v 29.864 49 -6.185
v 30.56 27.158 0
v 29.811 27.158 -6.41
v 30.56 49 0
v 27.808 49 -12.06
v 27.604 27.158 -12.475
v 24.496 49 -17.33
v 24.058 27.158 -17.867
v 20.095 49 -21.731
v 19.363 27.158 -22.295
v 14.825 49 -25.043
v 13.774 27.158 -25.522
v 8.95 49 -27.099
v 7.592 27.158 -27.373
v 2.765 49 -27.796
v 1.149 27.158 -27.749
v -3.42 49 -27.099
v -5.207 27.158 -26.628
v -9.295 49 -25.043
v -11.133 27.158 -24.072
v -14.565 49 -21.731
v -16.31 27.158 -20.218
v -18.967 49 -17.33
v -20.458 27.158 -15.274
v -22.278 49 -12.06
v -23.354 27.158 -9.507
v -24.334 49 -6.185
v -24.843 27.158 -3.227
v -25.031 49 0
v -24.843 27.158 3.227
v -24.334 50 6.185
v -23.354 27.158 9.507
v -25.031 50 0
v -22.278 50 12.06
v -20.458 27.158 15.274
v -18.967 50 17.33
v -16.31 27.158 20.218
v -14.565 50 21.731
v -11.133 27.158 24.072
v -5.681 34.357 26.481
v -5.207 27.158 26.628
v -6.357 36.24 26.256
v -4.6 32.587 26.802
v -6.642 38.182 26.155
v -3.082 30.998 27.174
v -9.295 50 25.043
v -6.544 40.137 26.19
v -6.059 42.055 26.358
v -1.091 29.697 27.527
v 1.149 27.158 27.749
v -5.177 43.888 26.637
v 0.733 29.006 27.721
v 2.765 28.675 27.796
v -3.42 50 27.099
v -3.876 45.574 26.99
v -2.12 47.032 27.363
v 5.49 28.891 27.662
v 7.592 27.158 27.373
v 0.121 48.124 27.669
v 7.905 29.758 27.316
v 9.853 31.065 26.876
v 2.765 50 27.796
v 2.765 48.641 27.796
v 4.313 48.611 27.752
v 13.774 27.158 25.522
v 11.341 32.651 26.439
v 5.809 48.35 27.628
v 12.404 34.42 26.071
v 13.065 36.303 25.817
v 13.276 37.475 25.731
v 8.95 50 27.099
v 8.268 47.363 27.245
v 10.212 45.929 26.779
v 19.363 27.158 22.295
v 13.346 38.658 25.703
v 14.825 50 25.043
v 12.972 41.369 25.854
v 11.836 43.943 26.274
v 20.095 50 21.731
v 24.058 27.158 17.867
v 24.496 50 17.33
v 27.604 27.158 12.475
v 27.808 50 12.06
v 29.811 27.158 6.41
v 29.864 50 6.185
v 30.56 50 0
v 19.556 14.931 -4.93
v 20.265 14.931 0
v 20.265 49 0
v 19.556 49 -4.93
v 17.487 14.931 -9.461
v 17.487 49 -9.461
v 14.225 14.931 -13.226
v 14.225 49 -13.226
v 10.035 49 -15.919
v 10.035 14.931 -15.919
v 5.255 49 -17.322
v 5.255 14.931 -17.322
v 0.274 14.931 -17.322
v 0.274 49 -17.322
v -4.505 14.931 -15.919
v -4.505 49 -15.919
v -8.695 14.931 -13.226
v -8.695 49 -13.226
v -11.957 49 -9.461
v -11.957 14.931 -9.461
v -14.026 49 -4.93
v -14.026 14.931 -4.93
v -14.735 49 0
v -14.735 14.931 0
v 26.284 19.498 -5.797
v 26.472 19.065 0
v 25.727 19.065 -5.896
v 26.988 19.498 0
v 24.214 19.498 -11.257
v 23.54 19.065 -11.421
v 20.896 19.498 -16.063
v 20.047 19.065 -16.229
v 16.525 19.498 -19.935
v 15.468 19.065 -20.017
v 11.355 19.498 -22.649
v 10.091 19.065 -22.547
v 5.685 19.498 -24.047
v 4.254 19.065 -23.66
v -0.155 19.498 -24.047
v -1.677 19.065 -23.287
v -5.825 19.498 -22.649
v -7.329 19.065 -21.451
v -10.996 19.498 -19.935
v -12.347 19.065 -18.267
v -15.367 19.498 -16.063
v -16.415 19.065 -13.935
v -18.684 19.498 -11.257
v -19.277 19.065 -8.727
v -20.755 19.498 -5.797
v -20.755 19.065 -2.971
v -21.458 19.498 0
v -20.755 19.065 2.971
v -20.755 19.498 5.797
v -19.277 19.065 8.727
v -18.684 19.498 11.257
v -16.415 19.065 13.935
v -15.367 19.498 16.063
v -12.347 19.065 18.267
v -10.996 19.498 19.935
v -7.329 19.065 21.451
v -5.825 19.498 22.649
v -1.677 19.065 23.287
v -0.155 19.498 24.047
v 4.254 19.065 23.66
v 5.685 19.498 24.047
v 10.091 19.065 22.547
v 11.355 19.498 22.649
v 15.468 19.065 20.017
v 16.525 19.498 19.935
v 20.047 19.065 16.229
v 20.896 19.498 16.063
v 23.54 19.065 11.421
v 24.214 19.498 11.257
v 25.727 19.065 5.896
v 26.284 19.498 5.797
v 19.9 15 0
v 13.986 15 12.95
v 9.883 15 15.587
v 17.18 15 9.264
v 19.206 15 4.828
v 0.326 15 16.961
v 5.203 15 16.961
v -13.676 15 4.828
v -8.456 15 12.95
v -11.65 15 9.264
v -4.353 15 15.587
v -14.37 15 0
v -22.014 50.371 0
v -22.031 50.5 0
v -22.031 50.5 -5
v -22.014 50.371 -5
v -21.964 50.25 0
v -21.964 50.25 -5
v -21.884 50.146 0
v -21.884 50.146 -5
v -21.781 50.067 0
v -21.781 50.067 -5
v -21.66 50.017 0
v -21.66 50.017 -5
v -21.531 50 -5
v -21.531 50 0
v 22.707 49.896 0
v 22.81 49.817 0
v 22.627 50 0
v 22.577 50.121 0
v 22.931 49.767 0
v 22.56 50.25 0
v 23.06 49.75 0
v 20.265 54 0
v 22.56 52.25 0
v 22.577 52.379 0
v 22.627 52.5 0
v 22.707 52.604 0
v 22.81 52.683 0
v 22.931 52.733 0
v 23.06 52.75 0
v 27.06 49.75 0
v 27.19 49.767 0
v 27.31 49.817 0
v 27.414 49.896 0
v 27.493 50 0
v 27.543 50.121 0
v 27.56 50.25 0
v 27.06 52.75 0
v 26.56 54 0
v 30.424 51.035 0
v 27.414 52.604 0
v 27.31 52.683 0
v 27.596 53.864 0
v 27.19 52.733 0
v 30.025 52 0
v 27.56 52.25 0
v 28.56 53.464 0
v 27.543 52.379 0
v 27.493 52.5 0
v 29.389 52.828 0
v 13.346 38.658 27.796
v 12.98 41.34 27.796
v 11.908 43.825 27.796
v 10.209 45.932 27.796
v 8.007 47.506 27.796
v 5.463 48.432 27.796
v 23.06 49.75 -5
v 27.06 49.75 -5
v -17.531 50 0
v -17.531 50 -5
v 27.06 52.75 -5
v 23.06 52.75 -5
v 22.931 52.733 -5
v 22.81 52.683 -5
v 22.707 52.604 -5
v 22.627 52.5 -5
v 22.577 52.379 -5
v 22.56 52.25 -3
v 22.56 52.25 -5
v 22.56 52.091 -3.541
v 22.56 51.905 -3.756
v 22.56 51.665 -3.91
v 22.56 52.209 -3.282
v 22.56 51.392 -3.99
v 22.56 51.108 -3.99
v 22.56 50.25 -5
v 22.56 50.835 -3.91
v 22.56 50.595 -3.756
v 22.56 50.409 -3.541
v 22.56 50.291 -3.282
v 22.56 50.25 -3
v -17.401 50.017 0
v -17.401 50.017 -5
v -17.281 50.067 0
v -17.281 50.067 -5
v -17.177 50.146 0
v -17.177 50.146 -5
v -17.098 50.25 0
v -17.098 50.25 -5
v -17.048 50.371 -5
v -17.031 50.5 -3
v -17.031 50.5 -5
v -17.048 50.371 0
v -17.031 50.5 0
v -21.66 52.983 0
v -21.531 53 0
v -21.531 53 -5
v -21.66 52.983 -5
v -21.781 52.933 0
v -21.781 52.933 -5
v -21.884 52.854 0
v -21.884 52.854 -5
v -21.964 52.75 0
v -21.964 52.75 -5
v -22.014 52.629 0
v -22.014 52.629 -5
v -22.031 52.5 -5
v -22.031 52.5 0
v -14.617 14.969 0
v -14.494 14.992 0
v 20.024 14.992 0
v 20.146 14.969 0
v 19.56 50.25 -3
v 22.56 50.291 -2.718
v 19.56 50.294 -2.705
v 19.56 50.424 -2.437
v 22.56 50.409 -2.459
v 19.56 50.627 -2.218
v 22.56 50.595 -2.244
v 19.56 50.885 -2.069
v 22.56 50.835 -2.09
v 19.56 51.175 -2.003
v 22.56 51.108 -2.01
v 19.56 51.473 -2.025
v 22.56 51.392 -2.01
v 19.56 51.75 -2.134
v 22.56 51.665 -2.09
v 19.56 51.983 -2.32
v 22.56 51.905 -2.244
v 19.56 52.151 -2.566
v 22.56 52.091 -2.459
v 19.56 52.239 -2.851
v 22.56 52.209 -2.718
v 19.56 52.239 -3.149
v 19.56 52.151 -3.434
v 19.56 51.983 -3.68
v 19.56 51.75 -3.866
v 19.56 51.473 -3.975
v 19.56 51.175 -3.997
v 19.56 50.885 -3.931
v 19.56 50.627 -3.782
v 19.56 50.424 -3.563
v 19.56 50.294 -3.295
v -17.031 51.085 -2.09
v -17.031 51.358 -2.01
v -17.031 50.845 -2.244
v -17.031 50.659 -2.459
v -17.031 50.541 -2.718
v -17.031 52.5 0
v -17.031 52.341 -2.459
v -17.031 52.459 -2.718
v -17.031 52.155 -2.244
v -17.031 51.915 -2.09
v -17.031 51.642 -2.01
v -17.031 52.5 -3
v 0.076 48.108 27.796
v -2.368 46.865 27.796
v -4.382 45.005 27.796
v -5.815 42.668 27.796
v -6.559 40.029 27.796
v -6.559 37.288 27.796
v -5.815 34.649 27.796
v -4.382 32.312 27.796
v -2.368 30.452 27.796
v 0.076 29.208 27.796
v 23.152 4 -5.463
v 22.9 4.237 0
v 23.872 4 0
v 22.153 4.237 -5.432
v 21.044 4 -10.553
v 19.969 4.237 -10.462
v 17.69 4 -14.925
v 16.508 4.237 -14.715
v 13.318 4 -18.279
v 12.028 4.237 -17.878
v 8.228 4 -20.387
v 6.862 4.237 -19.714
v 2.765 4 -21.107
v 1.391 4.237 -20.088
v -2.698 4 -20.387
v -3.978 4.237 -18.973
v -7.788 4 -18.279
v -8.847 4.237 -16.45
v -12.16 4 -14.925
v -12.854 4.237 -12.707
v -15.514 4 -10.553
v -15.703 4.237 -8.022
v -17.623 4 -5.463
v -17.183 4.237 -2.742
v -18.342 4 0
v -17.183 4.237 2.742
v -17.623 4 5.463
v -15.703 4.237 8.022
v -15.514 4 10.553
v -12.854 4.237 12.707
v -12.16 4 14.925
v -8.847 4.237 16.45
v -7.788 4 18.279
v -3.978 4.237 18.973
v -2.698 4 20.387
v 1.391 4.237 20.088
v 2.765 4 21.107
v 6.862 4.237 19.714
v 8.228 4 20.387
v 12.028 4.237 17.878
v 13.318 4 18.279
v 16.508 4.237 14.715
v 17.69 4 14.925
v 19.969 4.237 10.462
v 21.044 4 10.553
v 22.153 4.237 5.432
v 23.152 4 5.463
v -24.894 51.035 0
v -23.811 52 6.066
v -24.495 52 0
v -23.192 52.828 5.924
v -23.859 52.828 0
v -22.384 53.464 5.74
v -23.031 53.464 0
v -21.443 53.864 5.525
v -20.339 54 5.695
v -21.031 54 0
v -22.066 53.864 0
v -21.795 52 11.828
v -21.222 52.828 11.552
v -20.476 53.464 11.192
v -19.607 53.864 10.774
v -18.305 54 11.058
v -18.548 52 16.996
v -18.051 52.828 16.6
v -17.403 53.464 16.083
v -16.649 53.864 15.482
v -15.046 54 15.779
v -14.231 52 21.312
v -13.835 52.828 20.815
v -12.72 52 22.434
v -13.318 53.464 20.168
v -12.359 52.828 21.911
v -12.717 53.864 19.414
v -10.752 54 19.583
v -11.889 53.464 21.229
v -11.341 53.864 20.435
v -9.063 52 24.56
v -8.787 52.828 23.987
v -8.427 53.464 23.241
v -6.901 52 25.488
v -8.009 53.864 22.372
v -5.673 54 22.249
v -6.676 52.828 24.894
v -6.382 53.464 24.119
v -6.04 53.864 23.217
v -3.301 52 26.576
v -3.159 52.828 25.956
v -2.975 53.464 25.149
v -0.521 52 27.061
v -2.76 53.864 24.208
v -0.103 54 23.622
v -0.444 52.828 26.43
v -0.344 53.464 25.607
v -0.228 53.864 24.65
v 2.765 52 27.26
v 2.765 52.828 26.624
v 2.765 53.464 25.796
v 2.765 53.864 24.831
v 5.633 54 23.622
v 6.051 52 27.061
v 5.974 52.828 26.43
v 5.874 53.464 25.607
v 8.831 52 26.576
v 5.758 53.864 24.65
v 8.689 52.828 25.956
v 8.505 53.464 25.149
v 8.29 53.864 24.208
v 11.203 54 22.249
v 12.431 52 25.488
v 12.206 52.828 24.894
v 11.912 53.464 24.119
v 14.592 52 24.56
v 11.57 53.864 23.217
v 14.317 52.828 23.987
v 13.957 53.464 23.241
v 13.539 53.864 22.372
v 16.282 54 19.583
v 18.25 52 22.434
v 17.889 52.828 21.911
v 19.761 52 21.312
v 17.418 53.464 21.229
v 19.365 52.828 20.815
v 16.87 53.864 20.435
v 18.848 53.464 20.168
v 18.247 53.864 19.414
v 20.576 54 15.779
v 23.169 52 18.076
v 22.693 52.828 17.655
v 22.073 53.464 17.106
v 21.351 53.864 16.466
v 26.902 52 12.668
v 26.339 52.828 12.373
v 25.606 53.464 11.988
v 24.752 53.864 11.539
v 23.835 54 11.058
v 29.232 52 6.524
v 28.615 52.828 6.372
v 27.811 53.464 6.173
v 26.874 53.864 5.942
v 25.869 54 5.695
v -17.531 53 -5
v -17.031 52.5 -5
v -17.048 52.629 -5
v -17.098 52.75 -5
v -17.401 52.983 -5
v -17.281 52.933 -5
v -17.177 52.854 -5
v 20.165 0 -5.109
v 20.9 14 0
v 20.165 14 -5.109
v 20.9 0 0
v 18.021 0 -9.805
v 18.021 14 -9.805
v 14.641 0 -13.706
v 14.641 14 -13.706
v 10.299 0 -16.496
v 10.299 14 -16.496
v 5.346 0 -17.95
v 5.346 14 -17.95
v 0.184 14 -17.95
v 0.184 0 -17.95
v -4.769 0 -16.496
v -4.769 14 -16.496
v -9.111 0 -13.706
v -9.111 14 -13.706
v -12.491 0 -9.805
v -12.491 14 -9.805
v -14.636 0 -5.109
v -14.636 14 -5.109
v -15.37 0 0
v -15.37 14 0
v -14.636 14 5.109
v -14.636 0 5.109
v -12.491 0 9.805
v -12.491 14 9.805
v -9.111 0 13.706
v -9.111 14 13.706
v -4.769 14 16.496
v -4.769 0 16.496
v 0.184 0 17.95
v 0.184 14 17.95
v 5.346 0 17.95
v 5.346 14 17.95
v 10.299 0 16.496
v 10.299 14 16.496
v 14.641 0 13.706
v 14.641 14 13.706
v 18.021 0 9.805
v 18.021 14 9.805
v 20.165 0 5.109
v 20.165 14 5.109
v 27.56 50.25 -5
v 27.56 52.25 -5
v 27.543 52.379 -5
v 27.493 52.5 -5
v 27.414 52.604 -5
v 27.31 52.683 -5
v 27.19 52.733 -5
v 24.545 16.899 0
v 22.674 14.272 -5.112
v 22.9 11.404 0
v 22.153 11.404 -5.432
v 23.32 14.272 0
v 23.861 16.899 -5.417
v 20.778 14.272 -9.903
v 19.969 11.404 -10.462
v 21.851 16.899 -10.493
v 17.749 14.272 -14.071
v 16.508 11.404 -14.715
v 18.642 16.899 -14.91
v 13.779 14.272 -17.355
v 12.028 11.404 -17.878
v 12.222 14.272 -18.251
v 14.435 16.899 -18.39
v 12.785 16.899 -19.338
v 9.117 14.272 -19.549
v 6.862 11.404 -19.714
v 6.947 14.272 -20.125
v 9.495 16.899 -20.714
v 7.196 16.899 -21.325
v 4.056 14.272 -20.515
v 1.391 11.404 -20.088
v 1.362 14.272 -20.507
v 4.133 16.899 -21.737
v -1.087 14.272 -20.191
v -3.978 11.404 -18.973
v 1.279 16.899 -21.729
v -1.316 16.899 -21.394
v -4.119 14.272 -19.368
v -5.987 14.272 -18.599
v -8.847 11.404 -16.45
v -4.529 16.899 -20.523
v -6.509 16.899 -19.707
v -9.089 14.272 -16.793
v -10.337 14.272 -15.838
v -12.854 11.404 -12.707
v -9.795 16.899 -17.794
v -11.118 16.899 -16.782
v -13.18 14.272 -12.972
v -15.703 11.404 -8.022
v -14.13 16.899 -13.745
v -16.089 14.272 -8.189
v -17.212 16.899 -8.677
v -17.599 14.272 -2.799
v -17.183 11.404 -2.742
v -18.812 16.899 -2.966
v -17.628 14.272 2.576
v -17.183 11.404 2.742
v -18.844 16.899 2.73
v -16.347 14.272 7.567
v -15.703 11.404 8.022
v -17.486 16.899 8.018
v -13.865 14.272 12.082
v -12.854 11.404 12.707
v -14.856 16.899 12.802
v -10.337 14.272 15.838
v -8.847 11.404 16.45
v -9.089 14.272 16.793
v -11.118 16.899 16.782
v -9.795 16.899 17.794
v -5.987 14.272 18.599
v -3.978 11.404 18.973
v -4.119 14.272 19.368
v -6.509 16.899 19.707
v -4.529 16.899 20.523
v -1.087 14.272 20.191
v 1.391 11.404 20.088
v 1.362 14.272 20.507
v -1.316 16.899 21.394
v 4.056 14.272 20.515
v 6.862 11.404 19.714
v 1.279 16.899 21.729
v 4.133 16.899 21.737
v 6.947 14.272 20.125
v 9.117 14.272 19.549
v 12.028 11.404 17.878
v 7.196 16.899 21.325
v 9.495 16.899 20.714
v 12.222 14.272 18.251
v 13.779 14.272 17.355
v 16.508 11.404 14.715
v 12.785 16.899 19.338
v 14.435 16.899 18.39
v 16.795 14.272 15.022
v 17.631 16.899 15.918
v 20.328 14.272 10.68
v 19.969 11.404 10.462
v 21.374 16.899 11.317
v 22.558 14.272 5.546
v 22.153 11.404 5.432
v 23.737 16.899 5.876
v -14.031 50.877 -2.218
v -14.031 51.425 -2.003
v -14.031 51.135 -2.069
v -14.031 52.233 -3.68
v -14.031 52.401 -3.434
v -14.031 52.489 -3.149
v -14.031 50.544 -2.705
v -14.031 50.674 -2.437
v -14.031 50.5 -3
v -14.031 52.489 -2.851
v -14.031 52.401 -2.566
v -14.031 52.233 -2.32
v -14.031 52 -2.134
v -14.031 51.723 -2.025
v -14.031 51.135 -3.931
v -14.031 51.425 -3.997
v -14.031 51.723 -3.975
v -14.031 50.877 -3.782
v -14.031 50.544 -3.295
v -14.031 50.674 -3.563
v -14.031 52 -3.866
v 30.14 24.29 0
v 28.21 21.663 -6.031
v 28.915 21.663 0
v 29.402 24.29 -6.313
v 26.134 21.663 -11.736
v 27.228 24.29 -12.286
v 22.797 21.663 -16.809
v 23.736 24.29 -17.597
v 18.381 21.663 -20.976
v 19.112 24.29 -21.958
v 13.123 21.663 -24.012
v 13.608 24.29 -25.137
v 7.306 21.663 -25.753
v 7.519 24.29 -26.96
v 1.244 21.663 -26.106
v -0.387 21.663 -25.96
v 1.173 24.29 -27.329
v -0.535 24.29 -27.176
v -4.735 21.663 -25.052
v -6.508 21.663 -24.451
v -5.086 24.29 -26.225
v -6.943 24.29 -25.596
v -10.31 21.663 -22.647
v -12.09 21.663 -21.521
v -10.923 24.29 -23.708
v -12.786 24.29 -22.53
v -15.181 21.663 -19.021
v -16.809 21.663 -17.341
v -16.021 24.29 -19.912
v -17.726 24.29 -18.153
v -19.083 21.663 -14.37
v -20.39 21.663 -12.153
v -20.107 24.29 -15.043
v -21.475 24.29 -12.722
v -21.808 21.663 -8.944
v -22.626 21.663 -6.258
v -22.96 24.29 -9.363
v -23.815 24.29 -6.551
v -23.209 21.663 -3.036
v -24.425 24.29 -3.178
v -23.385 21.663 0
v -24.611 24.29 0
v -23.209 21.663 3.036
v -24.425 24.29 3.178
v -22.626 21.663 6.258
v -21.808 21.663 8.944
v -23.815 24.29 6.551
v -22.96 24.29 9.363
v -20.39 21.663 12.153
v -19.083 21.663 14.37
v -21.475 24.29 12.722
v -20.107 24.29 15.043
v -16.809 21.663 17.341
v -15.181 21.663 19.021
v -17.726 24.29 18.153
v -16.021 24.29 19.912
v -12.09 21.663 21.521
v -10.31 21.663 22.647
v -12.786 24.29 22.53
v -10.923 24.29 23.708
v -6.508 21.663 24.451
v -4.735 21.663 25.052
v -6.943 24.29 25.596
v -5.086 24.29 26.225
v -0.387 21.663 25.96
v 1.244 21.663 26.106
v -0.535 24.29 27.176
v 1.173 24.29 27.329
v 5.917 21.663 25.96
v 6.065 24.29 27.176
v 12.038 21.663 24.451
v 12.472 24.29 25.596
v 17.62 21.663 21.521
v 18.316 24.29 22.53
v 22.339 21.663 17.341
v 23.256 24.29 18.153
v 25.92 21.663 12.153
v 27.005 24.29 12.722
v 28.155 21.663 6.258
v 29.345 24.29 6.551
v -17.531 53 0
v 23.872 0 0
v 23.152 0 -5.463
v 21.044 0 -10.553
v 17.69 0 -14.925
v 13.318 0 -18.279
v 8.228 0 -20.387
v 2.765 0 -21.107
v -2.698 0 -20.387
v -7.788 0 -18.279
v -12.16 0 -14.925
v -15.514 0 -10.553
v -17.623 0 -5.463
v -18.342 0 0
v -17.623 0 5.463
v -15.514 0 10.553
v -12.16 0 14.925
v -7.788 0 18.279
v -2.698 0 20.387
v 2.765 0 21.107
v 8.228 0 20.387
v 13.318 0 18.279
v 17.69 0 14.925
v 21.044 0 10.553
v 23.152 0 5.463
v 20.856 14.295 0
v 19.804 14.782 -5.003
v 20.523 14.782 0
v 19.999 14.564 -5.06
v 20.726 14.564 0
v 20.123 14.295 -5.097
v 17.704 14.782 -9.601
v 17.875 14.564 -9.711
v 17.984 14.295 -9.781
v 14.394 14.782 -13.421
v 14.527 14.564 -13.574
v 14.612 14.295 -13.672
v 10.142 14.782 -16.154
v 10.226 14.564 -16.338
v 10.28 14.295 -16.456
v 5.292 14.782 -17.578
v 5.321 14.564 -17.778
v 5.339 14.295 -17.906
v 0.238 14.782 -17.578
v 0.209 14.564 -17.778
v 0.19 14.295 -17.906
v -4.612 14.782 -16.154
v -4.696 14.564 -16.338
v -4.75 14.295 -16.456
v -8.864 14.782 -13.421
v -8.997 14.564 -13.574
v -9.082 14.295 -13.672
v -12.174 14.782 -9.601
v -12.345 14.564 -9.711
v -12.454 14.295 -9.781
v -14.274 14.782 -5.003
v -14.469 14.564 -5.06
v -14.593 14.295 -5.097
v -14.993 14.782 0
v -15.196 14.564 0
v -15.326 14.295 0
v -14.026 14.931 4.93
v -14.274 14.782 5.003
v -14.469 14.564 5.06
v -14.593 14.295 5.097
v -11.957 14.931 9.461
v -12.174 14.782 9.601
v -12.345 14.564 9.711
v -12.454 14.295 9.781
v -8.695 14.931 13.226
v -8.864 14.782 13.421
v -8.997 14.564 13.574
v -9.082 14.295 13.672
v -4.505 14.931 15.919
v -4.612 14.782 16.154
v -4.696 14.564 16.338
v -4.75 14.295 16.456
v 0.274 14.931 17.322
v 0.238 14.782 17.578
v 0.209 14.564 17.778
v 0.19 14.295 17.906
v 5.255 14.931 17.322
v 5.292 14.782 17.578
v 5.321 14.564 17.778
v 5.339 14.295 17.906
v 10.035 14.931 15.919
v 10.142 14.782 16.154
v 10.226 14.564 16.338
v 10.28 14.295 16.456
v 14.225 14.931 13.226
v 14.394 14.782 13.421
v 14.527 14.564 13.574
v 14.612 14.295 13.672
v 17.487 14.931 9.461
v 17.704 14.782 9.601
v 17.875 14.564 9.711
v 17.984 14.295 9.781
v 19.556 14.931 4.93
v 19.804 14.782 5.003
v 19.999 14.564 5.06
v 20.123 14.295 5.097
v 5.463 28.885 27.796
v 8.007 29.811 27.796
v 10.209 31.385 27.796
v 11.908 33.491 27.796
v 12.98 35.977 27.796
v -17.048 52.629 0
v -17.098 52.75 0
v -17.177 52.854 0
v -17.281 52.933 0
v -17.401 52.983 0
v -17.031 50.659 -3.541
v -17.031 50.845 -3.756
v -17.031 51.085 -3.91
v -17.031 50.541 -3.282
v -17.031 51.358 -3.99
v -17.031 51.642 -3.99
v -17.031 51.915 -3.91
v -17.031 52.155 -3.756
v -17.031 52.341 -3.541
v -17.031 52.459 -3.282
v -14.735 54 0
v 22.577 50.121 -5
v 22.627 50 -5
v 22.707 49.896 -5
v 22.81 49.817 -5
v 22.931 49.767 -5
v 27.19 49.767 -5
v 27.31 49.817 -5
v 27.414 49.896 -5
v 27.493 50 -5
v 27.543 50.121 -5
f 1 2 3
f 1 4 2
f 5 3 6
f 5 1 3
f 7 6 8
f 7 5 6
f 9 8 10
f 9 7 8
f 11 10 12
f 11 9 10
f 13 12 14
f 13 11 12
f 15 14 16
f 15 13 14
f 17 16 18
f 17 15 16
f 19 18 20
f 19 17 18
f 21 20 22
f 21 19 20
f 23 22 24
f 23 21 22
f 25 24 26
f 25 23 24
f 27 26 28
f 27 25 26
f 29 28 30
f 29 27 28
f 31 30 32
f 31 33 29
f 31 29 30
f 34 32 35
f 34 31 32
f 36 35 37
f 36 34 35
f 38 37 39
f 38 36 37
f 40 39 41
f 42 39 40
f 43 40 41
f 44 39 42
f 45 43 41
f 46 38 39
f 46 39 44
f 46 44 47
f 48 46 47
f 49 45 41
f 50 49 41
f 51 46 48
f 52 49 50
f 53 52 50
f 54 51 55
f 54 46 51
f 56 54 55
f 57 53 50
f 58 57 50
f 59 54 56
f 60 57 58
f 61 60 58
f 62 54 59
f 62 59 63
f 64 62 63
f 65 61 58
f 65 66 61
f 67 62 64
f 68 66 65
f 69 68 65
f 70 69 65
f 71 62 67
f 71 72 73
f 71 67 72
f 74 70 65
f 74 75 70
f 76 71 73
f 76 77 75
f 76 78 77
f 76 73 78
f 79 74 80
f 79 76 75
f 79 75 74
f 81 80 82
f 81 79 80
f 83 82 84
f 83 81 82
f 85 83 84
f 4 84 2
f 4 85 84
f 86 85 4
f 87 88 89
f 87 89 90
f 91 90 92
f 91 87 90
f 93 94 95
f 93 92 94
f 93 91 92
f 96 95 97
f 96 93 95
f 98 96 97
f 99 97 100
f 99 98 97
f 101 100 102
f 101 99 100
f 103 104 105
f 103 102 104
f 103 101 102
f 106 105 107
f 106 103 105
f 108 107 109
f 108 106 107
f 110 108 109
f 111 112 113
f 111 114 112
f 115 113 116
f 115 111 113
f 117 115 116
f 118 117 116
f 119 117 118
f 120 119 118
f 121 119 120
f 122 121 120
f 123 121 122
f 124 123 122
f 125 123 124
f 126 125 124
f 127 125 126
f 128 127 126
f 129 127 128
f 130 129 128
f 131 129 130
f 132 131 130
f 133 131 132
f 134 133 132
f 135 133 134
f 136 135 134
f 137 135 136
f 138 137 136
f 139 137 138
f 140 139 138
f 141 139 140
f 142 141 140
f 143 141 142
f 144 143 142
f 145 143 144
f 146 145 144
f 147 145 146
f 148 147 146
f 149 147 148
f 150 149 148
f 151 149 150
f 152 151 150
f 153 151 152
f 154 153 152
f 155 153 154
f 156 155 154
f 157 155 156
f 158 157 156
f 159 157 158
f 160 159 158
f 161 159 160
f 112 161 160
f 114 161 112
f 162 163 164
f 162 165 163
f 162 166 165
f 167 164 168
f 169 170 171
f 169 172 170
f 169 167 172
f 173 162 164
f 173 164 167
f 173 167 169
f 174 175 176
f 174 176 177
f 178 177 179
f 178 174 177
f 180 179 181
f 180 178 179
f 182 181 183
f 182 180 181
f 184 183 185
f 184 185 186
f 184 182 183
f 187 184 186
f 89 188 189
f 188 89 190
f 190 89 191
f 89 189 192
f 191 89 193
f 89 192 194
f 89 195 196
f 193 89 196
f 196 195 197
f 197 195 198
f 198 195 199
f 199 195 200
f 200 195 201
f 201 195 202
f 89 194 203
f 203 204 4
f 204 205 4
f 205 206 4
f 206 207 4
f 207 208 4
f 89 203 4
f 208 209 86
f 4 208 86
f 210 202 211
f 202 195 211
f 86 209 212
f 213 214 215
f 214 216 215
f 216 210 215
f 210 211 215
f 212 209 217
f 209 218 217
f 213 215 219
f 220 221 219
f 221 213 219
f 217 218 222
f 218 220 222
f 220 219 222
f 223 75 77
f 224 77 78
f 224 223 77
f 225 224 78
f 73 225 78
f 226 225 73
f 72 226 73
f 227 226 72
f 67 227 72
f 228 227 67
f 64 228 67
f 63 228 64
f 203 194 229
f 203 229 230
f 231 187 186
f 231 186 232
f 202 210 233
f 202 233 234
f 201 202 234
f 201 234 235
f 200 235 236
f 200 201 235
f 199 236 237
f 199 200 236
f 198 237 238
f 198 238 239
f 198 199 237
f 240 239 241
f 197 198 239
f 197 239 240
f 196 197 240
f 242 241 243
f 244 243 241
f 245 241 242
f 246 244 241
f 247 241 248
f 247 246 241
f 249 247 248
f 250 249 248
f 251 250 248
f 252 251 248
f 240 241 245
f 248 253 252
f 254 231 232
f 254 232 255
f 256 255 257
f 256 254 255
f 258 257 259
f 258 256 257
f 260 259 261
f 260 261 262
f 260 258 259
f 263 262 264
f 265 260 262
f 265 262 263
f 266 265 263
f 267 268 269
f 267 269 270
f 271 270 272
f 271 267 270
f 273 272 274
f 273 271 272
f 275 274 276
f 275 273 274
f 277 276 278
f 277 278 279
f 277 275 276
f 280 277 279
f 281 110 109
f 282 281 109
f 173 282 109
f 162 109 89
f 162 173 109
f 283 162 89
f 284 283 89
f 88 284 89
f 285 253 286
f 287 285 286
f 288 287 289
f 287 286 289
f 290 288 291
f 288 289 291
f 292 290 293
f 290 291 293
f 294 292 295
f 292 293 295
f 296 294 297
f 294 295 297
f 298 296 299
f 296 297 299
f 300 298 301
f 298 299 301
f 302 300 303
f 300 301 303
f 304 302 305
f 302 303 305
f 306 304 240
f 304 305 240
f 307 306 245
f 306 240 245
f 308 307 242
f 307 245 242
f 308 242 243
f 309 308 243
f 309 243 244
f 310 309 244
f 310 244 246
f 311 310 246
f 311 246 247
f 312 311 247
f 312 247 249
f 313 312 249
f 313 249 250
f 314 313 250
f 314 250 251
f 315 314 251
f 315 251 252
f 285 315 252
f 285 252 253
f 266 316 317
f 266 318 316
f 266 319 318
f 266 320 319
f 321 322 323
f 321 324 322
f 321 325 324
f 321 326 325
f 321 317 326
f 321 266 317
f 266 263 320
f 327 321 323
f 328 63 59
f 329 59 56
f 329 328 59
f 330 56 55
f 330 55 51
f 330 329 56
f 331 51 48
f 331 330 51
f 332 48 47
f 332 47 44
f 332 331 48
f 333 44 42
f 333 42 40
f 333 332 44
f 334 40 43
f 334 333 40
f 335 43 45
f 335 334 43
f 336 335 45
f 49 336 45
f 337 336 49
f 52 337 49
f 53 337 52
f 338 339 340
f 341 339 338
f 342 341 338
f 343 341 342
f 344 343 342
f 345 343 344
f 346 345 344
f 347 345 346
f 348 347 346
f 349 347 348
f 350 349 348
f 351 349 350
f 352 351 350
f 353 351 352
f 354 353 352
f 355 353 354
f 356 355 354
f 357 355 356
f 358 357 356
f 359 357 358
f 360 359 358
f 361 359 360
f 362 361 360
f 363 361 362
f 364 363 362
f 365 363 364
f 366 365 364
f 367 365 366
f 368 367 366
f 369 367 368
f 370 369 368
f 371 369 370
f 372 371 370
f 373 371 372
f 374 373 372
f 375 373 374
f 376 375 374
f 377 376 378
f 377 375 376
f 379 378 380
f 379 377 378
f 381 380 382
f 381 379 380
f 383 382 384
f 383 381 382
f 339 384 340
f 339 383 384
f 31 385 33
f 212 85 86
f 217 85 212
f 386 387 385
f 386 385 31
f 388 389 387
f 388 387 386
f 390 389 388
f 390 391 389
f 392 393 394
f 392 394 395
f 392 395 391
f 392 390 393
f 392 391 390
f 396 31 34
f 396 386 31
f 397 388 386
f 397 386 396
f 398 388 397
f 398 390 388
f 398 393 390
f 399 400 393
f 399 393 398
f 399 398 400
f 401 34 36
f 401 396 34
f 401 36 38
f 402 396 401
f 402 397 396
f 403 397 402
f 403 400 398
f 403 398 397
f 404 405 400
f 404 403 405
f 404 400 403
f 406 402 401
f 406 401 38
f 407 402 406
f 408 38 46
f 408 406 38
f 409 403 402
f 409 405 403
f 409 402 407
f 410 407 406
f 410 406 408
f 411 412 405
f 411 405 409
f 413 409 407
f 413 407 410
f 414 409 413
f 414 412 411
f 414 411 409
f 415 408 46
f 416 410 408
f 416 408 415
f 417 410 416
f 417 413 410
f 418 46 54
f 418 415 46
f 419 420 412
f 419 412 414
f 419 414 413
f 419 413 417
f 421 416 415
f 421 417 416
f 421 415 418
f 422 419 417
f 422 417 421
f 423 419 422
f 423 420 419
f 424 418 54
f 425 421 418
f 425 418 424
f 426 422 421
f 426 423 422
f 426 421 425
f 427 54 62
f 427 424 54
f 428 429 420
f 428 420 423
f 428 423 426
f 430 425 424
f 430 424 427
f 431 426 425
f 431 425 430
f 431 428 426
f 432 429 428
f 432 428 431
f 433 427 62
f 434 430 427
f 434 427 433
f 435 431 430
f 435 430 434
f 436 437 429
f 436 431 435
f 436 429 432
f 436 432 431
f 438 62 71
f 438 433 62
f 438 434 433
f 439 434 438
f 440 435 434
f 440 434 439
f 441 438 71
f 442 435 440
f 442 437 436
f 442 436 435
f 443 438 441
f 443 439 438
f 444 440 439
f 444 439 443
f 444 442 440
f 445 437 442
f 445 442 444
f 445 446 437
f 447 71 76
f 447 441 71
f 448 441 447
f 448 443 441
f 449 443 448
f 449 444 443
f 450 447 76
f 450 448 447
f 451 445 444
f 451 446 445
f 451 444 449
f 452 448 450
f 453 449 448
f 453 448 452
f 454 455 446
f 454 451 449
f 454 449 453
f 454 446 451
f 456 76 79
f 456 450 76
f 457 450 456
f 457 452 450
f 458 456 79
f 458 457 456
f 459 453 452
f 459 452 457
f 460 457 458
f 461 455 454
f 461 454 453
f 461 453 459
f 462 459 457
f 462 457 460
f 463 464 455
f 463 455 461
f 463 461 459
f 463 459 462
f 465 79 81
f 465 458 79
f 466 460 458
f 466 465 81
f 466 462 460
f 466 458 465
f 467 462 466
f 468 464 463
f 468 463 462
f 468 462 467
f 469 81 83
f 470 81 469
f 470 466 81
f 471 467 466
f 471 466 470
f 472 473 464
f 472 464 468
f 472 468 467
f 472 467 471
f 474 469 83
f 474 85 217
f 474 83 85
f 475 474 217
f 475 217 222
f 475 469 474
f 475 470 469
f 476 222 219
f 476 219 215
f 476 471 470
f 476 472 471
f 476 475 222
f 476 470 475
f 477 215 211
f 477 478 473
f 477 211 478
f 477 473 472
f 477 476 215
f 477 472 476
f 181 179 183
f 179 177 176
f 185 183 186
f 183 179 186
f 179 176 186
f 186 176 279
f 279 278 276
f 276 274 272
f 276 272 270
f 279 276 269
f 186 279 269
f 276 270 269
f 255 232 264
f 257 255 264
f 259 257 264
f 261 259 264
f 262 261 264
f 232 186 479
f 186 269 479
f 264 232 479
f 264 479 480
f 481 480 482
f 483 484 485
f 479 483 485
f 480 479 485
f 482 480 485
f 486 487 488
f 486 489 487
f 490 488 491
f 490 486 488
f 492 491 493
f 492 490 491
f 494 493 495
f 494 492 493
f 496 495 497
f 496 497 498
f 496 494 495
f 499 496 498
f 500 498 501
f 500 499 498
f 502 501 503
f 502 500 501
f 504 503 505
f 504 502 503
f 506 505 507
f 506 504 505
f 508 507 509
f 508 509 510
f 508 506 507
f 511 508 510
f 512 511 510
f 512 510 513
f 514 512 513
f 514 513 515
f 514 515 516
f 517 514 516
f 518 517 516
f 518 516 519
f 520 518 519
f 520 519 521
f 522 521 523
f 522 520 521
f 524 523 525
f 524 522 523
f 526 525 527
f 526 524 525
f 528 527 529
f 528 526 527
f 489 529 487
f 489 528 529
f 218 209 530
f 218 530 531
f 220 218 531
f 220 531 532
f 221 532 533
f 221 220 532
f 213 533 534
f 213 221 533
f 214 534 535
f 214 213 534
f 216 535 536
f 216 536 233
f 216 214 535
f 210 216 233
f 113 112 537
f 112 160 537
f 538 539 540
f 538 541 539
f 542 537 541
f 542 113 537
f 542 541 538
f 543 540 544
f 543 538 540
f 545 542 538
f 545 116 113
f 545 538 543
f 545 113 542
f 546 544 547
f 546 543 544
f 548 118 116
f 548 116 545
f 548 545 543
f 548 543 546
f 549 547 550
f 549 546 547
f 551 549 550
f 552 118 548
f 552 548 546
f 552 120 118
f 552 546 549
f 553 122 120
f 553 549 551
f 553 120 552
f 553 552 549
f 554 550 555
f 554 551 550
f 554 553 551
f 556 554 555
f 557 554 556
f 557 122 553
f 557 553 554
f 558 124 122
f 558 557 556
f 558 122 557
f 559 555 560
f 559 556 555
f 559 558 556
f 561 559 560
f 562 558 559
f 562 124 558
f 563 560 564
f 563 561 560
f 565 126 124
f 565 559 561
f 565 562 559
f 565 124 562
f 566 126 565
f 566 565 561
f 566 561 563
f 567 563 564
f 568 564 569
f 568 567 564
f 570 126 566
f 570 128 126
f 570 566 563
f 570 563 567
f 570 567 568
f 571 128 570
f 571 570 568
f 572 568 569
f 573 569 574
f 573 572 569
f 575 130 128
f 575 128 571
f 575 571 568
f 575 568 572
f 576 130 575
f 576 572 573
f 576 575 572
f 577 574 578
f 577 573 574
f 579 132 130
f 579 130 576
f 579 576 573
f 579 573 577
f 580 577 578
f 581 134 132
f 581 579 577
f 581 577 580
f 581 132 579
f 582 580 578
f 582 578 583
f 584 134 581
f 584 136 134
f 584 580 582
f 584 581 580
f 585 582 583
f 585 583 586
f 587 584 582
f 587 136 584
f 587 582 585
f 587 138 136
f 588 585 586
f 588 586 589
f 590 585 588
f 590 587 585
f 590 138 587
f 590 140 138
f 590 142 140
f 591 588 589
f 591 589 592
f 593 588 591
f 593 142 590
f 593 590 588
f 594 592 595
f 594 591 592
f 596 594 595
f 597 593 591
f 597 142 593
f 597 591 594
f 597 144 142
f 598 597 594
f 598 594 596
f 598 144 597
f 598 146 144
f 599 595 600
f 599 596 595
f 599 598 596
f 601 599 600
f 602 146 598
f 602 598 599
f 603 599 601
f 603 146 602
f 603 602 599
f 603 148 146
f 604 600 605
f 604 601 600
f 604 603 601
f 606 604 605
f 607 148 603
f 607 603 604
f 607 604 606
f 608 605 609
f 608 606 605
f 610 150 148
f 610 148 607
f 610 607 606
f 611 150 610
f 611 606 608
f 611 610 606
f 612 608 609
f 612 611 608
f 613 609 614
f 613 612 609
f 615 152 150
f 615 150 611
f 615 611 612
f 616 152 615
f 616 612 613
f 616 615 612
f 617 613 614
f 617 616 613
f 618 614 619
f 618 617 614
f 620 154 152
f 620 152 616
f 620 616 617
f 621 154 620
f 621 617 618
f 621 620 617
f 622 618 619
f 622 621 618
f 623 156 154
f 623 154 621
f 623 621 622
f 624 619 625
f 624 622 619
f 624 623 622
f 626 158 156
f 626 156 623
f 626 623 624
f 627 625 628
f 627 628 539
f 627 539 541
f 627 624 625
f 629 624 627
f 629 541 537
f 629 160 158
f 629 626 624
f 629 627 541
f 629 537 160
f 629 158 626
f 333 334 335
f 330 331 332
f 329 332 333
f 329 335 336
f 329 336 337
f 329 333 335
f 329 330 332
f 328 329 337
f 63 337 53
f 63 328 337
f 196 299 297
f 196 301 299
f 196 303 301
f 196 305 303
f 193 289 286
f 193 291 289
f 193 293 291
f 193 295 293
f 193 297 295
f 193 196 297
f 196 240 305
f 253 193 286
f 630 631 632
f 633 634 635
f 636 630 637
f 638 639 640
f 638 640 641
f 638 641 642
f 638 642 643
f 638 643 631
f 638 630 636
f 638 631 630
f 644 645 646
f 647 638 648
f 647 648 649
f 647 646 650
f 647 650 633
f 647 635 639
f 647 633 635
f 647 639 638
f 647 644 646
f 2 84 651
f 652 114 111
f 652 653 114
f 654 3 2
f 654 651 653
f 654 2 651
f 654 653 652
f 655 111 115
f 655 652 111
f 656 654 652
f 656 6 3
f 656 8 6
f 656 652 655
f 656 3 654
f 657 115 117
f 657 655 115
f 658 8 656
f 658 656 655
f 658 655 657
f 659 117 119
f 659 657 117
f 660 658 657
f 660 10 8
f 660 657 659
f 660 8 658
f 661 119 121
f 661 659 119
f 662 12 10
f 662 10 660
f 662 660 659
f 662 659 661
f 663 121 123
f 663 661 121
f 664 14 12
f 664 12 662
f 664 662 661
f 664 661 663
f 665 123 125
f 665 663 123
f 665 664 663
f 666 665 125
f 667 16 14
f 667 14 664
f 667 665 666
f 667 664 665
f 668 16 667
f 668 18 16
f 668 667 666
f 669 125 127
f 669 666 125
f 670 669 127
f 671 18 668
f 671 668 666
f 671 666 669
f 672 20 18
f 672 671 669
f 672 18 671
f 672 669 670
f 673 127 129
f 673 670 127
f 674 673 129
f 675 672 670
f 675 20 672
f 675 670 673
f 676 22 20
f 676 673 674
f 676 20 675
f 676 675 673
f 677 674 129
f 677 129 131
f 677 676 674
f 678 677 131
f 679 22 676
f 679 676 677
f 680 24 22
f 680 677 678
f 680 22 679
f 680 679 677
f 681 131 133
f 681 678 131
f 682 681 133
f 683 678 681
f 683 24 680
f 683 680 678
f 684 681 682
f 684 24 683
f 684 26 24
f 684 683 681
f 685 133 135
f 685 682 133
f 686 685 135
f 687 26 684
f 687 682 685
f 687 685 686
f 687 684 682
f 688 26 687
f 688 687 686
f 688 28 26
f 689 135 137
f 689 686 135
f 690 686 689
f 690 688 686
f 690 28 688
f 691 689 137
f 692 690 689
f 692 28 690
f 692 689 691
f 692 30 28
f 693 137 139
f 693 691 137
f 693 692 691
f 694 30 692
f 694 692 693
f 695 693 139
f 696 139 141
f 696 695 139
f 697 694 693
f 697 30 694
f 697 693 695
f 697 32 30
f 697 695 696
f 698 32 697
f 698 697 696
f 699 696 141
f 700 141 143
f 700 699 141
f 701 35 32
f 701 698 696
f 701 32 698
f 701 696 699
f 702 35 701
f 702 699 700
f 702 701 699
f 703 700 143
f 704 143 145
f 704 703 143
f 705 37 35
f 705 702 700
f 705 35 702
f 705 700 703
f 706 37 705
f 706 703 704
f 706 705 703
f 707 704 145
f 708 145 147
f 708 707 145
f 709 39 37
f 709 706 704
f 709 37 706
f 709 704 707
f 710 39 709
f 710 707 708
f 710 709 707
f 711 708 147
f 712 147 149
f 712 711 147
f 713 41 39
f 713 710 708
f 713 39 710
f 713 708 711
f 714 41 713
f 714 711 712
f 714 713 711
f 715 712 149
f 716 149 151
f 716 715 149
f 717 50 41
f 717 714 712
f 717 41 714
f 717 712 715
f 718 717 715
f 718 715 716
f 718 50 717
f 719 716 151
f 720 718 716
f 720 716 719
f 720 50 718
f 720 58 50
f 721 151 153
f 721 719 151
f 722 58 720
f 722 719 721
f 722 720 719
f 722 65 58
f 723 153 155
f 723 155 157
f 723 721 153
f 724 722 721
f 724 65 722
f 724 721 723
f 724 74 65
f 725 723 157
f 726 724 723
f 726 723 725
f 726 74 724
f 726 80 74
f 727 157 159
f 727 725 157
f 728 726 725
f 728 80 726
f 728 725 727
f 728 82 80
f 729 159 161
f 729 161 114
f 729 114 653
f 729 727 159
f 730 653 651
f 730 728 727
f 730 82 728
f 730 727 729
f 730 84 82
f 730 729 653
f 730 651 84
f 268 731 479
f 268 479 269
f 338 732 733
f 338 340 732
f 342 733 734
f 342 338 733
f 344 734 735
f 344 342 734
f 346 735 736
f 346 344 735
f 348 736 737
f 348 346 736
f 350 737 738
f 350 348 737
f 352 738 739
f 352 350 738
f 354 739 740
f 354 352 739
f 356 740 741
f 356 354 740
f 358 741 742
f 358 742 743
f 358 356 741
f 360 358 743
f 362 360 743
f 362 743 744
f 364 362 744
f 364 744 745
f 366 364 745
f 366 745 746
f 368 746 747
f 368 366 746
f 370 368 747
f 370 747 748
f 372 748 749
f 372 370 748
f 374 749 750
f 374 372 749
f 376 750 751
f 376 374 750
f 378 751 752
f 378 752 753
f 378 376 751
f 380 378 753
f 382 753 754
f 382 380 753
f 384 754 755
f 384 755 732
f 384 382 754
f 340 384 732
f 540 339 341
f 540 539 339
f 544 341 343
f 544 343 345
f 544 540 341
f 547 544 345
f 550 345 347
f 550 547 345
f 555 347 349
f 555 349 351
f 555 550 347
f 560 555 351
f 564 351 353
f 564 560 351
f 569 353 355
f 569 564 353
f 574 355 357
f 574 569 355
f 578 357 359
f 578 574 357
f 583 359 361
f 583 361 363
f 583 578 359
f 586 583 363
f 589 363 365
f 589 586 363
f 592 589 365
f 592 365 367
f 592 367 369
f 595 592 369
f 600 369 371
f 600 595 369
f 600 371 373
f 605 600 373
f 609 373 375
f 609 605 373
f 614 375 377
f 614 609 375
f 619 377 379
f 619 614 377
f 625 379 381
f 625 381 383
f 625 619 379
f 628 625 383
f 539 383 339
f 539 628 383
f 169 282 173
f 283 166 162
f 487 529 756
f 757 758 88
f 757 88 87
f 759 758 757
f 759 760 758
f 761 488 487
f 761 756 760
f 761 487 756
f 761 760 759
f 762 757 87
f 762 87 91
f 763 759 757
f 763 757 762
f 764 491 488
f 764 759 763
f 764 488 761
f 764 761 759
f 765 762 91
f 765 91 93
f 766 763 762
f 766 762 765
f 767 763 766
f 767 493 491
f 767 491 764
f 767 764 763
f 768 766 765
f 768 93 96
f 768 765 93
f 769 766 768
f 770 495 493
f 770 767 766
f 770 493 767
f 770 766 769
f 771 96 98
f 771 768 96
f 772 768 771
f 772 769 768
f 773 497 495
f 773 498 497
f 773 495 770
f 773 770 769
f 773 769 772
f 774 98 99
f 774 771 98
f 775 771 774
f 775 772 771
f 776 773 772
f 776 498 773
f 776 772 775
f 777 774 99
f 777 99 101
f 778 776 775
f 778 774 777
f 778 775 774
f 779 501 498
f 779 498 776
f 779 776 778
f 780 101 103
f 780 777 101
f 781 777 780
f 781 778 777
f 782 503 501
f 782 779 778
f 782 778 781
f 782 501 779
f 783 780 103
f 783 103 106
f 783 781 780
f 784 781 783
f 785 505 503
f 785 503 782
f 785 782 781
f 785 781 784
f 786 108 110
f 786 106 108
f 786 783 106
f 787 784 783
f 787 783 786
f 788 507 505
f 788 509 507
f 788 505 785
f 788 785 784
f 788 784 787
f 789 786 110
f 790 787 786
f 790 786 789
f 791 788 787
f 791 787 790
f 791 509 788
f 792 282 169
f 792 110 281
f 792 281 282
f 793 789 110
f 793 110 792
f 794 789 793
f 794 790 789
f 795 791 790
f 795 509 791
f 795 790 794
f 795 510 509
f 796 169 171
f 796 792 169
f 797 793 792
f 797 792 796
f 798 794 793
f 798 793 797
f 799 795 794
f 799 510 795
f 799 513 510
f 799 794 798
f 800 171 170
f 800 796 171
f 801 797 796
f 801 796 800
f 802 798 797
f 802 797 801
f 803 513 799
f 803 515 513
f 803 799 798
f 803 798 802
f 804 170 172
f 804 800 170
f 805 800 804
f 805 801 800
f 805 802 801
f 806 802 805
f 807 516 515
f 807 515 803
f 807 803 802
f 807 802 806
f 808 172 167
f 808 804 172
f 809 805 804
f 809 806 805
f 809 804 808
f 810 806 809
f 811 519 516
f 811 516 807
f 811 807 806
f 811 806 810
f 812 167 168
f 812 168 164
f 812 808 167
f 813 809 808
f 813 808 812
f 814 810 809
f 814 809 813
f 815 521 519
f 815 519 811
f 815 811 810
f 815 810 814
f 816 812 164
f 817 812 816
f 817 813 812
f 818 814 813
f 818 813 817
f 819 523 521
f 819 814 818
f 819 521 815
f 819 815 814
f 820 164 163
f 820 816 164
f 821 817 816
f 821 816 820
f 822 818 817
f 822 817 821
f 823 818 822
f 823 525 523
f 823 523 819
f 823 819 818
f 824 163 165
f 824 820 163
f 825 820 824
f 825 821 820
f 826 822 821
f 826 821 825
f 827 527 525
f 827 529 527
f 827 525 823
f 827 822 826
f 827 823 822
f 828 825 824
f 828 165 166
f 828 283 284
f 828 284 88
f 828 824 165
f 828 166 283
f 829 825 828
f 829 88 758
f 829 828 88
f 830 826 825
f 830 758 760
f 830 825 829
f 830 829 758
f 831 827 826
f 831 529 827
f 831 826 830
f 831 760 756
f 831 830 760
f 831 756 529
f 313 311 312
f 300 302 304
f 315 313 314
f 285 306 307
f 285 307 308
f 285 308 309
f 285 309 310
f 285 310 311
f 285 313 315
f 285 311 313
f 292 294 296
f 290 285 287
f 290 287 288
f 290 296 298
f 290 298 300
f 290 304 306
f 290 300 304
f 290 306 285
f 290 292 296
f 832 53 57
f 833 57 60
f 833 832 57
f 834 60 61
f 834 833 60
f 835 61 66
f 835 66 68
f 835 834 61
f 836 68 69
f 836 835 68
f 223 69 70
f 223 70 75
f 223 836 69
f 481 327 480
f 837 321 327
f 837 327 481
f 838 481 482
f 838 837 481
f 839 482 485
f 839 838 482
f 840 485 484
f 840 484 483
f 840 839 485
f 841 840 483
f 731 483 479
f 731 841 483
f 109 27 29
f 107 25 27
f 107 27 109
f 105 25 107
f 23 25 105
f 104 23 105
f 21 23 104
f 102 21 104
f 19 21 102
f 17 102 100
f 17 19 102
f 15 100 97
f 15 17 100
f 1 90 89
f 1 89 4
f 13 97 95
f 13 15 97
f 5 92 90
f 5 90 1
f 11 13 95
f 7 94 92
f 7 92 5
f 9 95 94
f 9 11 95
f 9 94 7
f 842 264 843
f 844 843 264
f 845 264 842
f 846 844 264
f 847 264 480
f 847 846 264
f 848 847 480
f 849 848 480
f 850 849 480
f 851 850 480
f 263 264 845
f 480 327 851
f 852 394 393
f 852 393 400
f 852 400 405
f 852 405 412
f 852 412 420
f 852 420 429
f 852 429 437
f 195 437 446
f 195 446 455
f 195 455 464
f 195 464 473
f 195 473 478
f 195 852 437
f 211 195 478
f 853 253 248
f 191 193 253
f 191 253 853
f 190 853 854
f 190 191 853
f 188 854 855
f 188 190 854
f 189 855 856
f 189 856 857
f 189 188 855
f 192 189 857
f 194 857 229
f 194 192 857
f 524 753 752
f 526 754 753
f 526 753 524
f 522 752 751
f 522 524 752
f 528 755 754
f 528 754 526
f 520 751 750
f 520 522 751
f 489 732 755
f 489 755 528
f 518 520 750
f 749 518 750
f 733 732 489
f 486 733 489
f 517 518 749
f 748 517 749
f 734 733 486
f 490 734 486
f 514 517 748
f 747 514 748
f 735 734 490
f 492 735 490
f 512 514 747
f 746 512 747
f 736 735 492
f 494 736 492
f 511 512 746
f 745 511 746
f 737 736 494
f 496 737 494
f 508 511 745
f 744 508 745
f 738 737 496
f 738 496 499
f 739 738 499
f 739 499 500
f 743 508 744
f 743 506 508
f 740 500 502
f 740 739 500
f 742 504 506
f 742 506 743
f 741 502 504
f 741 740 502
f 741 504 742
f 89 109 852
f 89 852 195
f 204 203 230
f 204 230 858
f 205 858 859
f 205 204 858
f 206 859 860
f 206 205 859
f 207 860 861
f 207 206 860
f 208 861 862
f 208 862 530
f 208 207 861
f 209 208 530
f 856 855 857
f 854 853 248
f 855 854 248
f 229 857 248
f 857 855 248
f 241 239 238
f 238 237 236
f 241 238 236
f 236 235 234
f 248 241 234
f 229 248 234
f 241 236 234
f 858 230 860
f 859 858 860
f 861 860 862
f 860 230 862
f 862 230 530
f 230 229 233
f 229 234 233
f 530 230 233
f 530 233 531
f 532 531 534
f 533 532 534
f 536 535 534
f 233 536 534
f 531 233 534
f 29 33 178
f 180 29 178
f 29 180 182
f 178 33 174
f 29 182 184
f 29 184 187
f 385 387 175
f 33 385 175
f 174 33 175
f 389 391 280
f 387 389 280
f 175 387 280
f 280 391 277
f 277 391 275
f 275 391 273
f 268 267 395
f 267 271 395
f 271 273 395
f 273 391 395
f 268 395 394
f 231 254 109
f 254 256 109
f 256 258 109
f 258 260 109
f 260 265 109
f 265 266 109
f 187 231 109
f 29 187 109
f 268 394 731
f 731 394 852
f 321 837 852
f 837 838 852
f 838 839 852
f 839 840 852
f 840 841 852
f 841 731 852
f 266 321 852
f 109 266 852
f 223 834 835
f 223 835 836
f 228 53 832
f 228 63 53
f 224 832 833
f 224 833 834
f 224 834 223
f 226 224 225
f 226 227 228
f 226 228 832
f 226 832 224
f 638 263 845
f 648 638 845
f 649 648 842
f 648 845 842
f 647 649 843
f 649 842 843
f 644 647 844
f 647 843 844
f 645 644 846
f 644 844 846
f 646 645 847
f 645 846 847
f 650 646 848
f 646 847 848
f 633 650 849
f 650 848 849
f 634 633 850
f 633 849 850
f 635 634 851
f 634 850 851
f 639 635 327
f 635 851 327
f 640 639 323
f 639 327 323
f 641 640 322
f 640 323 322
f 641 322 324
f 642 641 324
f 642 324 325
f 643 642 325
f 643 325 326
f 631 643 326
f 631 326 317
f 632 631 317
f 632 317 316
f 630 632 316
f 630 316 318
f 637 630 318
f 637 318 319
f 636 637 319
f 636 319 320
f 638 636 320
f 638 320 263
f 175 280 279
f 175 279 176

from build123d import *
from build123d.topology import SkipClean

# Parameters (mm, degrees)
SKETCH10_R              = 10
BOSS_EXTRUDE1_DEPTH     = 5
CUT_EXTRUDE3_DEPTH      = 45
CUT_EXTRUDE3_DEPTH_BACK = 20
CUT_EXTRUDE5_DEPTH      = 5
BOSS_EXTRUDE2_DEPTH     = 5
SKETCH14_R              = 1
BOSS_EXTRUDE3_DEPTH     = 3
SKETCH15_R              = 1
BOSS_EXTRUDE4_DEPTH     = 3


with BuildPart() as part:
    # Sketch1 → Revolve1 (revolve)
    with BuildSketch(Plane.XY):
        with BuildLine():
            Line((20.9, 0), (23.871591838, 0))
            Line((23.871591838, 0), (23.871591838, 4))
            Line((23.871591838, 4), (22.9, 4.236662843))
            Line((22.9, 4.236662843), (22.9, 11.404308102))
            ThreePointArc((22.9, 11.404308102), (23.83692213, 15.63049072), (26.472123903, 19.064752533))
            Line((26.472123903, 19.064752533), (26.988320528, 19.497892931))
            ThreePointArc((26.988320528, 19.497892931), (29.623522302, 22.932154745), (30.560444431, 27.158337362))
            Line((30.560444431, 27.158337362), (30.560444431, 50))
            ThreePointArc((30.560444431, 50), (29.388871556, 52.828427125), (26.560444431, 54))
            Line((26.560444431, 54), (2.764914955, 54))
            Line((2.764914955, 54), (2.764914955, 15))
            Line((2.764914955, 15), (19.9, 15))
            ThreePointArc((19.9, 15), (20.607106781, 14.707106781), (20.9, 14))
            Line((20.9, 14), (20.9, 0))
        make_face()
    revolve(axis=Axis((2.764914955, 7.821821657, 0), (0, 1, 0)))

    # Sketch10 → Boss-Extrude1 (add)
    with SkipClean():  # the faces are left unmerged after this step: merging them gives an invalid solid
        with BuildSketch(Plane.XY.offset(27.795529476)):
            with Locations((3.346345887, 38.658337362)):
                Circle(SKETCH10_R)
        extrude(amount=-BOSS_EXTRUDE1_DEPTH)

    # Sketch11 → Cut-Extrude3 (cut, two sides: drawn at the far end of the back side and taken through both)
    with SkipClean():  # the faces are left unmerged after this step: merging them gives an invalid solid
        with BuildSketch(Plane(origin=(0, 17, 0), x_dir=(1, 0, 0), z_dir=(0, 1, 0)).offset(-CUT_EXTRUDE3_DEPTH_BACK)):
            with BuildLine():
                Line((-14.735085045, 0), (20.264914955, 0))
                ThreePointArc((20.264914955, 0), (2.764914955, 17.5), (-14.735085045, 0))
            make_face()
        extrude(amount=CUT_EXTRUDE3_DEPTH + CUT_EXTRUDE3_DEPTH_BACK, mode=Mode.SUBTRACT)

    # Sketch9 → Cut-Extrude5 (cut)
    with SkipClean():  # the faces are left unmerged after this step: merging them gives an invalid solid
        with BuildSketch(Plane(origin=(0, 54, 0), x_dir=(1, 0, 0), z_dir=(0, 1, 0))):
            with BuildLine():
                Line((-25.235085045, 0), (30.764914955, 0))
                ThreePointArc((30.764914955, 0), (2.764914955, 28), (-25.235085045, 0))
            make_face()
        extrude(amount=-CUT_EXTRUDE5_DEPTH, mode=Mode.SUBTRACT)

    # Sketch13 → Boss-Extrude2 (add)
    with SkipClean():  # the faces are left unmerged after this step: merging them gives an invalid solid
        with BuildSketch(Plane(origin=(0, 0, 0), x_dir=(-1, 0, 0), z_dir=(0, 0, -1))):
            with BuildLine():
                Line((17.53061452, 53), (21.53061452, 53))
                ThreePointArc((21.53061452, 53), (21.884167911, 52.853553391), (22.03061452, 52.5))
                Line((22.03061452, 52.5), (22.03061452, 50.5))
                ThreePointArc((22.03061452, 50.5), (21.884167911, 50.146446609), (21.53061452, 50))
                Line((21.53061452, 50), (17.53061452, 50))
                ThreePointArc((17.53061452, 50), (17.17706113, 50.146446609), (17.03061452, 50.5))
                Line((17.03061452, 50.5), (17.03061452, 52.5))
                ThreePointArc((17.03061452, 52.5), (17.17706113, 52.853553391), (17.53061452, 53))
            make_face()
            with BuildLine():
                Line((-27.060444431, 52.75), (-23.060444431, 52.75))
                ThreePointArc((-23.060444431, 52.75), (-22.706891041, 52.603553391), (-22.560444431, 52.25))
                Line((-22.560444431, 52.25), (-22.560444431, 50.25))
                ThreePointArc((-22.560444431, 50.25), (-22.706891041, 49.896446609), (-23.060444431, 49.75))
                Line((-23.060444431, 49.75), (-27.060444431, 49.75))
                ThreePointArc((-27.060444431, 49.75), (-27.413997822, 49.896446609), (-27.560444431, 50.25))
                Line((-27.560444431, 50.25), (-27.560444431, 52.25))
                ThreePointArc((-27.560444431, 52.25), (-27.413997822, 52.603553391), (-27.060444431, 52.75))
            make_face()
        extrude(amount=BOSS_EXTRUDE2_DEPTH)

    # Sketch14 → Boss-Extrude3 (add)
    with SkipClean():  # the faces are left unmerged after this step: merging them gives an invalid solid
        with BuildSketch(Plane.ZY.offset(-22.560444431)):
            with Locations((-3, 51.25)):
                Circle(SKETCH14_R)
        extrude(amount=BOSS_EXTRUDE3_DEPTH)

    # Sketch15 → Boss-Extrude4 (add)
    with SkipClean():  # the faces are left unmerged after this step: merging them gives an invalid solid
        with BuildSketch(Plane(origin=(-17.03061452, 0, 0), x_dir=(0, 0, -1), z_dir=(1, 0, 0))):
            with Locations((3, 51.5)):
                Circle(SKETCH15_R)
        extrude(amount=BOSS_EXTRUDE4_DEPTH)


solid = part.part
